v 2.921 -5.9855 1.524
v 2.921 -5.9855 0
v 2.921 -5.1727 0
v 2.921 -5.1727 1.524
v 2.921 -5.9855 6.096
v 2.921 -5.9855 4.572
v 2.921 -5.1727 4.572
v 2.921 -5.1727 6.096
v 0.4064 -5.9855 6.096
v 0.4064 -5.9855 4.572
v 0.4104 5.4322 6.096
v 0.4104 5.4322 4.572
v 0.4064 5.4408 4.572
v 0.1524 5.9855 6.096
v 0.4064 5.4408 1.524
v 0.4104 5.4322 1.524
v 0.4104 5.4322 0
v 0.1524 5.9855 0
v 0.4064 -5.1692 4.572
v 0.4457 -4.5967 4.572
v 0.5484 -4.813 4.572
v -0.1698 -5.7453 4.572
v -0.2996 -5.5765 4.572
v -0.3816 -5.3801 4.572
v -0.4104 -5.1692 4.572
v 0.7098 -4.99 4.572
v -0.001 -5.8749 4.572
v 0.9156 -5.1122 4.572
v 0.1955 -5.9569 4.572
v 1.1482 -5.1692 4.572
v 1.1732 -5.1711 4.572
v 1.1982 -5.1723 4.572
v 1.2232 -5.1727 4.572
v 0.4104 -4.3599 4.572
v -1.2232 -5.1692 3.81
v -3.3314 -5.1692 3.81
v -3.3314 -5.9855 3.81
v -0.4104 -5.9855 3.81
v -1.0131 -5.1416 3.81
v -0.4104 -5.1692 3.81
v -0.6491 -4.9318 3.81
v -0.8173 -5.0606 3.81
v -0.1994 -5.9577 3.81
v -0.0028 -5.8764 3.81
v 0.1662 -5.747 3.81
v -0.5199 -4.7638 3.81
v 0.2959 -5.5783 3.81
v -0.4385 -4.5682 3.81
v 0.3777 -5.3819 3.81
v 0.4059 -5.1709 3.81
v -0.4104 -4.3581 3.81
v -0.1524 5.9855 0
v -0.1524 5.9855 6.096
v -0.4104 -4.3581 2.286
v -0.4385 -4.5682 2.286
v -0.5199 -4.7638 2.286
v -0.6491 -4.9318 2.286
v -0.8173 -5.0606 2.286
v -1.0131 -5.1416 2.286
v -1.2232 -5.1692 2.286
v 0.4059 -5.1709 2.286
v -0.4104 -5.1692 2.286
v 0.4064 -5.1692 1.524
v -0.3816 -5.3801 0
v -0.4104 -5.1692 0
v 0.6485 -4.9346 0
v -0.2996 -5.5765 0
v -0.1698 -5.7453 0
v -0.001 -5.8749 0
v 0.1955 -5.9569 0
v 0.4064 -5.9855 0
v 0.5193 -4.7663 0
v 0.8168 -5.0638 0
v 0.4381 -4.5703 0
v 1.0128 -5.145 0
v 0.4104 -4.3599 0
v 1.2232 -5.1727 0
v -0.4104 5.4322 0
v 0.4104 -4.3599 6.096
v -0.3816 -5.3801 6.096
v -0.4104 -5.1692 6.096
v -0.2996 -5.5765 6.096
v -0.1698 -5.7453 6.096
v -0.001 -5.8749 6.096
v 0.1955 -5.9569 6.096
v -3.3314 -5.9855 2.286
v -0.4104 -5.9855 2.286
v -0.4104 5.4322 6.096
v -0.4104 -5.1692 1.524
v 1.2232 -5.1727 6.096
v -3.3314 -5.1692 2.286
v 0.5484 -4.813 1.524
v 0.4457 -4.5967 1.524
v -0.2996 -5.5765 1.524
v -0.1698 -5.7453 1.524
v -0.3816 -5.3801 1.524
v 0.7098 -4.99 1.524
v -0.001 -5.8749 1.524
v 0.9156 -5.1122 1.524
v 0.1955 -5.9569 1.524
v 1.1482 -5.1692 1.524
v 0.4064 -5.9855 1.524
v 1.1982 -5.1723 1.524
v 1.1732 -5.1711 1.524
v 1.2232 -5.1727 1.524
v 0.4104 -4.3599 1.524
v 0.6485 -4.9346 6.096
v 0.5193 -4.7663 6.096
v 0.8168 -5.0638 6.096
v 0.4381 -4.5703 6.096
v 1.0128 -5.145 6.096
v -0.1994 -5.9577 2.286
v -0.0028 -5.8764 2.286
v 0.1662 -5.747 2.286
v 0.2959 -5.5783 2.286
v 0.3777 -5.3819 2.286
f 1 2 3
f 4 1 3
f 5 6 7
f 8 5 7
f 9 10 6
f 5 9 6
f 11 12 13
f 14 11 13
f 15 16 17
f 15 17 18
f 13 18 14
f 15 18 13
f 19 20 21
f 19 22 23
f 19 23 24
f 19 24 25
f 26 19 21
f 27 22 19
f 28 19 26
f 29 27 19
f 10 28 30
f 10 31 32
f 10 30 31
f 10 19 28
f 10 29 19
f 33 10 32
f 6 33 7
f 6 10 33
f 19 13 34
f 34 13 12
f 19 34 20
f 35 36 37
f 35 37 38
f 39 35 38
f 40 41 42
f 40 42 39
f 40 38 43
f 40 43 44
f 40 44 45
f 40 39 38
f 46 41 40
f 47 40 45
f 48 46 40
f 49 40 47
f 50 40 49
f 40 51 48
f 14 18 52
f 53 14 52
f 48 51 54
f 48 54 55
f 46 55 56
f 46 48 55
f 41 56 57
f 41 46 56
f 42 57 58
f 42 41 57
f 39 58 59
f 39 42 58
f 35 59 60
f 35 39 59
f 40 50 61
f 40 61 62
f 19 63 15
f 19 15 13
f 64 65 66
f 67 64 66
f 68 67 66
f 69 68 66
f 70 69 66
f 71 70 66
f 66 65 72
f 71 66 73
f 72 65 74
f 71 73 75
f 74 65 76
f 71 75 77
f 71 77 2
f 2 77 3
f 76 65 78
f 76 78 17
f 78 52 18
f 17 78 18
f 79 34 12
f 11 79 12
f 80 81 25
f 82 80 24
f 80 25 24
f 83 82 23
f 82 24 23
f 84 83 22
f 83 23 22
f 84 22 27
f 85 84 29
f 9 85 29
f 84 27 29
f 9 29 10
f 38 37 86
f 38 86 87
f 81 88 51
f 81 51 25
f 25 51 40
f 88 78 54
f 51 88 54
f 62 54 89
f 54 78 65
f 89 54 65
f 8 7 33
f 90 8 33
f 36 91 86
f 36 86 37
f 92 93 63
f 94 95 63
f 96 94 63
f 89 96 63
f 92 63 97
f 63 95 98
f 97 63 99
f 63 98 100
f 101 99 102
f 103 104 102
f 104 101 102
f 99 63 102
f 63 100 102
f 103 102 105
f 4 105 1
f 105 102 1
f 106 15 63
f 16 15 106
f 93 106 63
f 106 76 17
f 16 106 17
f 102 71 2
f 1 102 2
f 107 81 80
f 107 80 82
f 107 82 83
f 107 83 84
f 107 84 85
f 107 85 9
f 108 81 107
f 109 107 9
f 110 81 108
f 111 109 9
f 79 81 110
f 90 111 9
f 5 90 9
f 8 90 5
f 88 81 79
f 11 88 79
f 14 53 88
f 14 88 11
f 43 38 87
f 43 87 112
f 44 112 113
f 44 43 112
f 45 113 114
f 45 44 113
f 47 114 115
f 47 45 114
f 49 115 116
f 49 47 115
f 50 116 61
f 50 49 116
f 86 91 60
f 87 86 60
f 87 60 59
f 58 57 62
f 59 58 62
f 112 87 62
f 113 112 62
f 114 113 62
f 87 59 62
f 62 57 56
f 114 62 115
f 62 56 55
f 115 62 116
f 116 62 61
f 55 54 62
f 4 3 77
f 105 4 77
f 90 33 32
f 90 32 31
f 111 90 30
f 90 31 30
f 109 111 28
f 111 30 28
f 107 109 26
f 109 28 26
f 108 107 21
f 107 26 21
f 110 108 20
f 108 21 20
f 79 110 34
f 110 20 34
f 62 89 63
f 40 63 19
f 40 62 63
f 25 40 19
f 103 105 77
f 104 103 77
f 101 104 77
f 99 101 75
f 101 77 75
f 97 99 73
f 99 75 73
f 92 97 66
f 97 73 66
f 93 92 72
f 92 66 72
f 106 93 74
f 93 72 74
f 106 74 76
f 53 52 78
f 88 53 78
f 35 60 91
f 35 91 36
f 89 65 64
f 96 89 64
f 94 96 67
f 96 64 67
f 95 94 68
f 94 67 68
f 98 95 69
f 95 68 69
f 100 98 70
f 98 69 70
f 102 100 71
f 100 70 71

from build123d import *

# Parameters (mm, degrees)
BOSS_EXTRUDE1_DEPTH = 6.096
SKETCH2_W           = 3.048
SKETCH2_H           = 0.816265766
CUT_EXTRUDE1_DEPTH  = 10.169833116
SKETCH3_W           = 1.524
SKETCH3_H           = 0.816265766
BOSS_EXTRUDE2_DEPTH = 2.921
BOSS_EXTRUDE3_DEPTH = 1.524
SKETCH7_W           = 0.741832356
SKETCH7_H           = 3.048
CUT_EXTRUDE3_DEPTH  = 14.141059814


with BuildPart() as part:
    # Sketch1 → Boss-Extrude1 (new body)
    with BuildSketch(Plane.XY):
        with BuildLine():
            Line((0.410410125, 5.432205501), (0.1524, 5.98551))
            Line((0.1524, 5.98551), (-0.1524, 5.98551))
            Line((-0.1524, 5.98551), (-0.410410125, 5.432205501))
            Line((-0.410410125, 5.432205501), (-0.410410125, -5.169217411))
            ThreePointArc((-0.410410125, -5.169217411), (-0.169813529, -5.745269384), (0.406398179, -5.985483177))
            Line((0.406398179, -5.985483177), (2.921, -5.985483177))
            Line((2.921, -5.985483177), (2.921, -5.172683177))
            Line((2.921, -5.172683177), (1.223210125, -5.172683177))
            ThreePointArc((1.223210125, -5.172683177), (0.648473733, -4.934619569), (0.410410125, -4.359883177))
            Line((0.410410125, -4.359883177), (0.410410125, 5.432205501))
        make_face()
    extrude(amount=BOSS_EXTRUDE1_DEPTH)

    # Sketch2 → Cut-Extrude1 (cut, through all)
    with BuildSketch(Plane.ZY.offset(0.410410125)):
        with Locations((3.048, -5.577350294)):
            Rectangle(SKETCH2_W, SKETCH2_H)
    extrude(amount=-CUT_EXTRUDE1_DEPTH, mode=Mode.SUBTRACT)


with BuildPart() as body_2:
    # Sketch3 → Boss-Extrude2 (new body)
    with BuildSketch(Plane.ZY.offset(0.410410125)):
        with Locations((3.048, -5.577350294)):
            Rectangle(SKETCH3_W, SKETCH3_H)
    extrude(amount=BOSS_EXTRUDE2_DEPTH)


with BuildPart() as boss_extrude3_tool:
    # Sketch4 → Boss-Extrude3 (new body)
    with BuildSketch(Plane.XY.offset(3.81)):
        with BuildLine():
            Line((-1.223210125, -5.169217411), (-1.223210125, -5.985483177))
            Line((-1.223210125, -5.985483177), (-0.410410125, -5.985483177))
            ThreePointArc((-0.410410125, -5.985483177), (0.166164352, -5.747016402), (0.405853805, -5.170949135))
            Line((0.405853805, -5.170949135), (-0.410410125, -5.169217411))
            Line((-0.410410125, -5.169217411), (-0.410411954, -4.358141783))
            ThreePointArc((-0.410411954, -4.358141783), (-0.649083714, -4.931763137), (-1.223210125, -5.169217411))
        make_face()
    extrude(amount=-BOSS_EXTRUDE3_DEPTH)


with BuildPart() as part_1:
    add(part.part)


with BuildPart() as part_2:
    # Boss-Extrude3: joined with boss_extrude3_tool
    add(part_1.part.fuse(boss_extrude3_tool.part, body_2.part, tol=0.00001))

    # Sketch7 → Cut-Extrude3 (cut, through all)
    with BuildSketch(Plane.XZ.offset(5.169217411)):
        with Locations((0.777314357, 3.048)):
            Rectangle(SKETCH7_W, SKETCH7_H)
    extrude(amount=-CUT_EXTRUDE3_DEPTH, mode=Mode.SUBTRACT)


solid = part_2.part
